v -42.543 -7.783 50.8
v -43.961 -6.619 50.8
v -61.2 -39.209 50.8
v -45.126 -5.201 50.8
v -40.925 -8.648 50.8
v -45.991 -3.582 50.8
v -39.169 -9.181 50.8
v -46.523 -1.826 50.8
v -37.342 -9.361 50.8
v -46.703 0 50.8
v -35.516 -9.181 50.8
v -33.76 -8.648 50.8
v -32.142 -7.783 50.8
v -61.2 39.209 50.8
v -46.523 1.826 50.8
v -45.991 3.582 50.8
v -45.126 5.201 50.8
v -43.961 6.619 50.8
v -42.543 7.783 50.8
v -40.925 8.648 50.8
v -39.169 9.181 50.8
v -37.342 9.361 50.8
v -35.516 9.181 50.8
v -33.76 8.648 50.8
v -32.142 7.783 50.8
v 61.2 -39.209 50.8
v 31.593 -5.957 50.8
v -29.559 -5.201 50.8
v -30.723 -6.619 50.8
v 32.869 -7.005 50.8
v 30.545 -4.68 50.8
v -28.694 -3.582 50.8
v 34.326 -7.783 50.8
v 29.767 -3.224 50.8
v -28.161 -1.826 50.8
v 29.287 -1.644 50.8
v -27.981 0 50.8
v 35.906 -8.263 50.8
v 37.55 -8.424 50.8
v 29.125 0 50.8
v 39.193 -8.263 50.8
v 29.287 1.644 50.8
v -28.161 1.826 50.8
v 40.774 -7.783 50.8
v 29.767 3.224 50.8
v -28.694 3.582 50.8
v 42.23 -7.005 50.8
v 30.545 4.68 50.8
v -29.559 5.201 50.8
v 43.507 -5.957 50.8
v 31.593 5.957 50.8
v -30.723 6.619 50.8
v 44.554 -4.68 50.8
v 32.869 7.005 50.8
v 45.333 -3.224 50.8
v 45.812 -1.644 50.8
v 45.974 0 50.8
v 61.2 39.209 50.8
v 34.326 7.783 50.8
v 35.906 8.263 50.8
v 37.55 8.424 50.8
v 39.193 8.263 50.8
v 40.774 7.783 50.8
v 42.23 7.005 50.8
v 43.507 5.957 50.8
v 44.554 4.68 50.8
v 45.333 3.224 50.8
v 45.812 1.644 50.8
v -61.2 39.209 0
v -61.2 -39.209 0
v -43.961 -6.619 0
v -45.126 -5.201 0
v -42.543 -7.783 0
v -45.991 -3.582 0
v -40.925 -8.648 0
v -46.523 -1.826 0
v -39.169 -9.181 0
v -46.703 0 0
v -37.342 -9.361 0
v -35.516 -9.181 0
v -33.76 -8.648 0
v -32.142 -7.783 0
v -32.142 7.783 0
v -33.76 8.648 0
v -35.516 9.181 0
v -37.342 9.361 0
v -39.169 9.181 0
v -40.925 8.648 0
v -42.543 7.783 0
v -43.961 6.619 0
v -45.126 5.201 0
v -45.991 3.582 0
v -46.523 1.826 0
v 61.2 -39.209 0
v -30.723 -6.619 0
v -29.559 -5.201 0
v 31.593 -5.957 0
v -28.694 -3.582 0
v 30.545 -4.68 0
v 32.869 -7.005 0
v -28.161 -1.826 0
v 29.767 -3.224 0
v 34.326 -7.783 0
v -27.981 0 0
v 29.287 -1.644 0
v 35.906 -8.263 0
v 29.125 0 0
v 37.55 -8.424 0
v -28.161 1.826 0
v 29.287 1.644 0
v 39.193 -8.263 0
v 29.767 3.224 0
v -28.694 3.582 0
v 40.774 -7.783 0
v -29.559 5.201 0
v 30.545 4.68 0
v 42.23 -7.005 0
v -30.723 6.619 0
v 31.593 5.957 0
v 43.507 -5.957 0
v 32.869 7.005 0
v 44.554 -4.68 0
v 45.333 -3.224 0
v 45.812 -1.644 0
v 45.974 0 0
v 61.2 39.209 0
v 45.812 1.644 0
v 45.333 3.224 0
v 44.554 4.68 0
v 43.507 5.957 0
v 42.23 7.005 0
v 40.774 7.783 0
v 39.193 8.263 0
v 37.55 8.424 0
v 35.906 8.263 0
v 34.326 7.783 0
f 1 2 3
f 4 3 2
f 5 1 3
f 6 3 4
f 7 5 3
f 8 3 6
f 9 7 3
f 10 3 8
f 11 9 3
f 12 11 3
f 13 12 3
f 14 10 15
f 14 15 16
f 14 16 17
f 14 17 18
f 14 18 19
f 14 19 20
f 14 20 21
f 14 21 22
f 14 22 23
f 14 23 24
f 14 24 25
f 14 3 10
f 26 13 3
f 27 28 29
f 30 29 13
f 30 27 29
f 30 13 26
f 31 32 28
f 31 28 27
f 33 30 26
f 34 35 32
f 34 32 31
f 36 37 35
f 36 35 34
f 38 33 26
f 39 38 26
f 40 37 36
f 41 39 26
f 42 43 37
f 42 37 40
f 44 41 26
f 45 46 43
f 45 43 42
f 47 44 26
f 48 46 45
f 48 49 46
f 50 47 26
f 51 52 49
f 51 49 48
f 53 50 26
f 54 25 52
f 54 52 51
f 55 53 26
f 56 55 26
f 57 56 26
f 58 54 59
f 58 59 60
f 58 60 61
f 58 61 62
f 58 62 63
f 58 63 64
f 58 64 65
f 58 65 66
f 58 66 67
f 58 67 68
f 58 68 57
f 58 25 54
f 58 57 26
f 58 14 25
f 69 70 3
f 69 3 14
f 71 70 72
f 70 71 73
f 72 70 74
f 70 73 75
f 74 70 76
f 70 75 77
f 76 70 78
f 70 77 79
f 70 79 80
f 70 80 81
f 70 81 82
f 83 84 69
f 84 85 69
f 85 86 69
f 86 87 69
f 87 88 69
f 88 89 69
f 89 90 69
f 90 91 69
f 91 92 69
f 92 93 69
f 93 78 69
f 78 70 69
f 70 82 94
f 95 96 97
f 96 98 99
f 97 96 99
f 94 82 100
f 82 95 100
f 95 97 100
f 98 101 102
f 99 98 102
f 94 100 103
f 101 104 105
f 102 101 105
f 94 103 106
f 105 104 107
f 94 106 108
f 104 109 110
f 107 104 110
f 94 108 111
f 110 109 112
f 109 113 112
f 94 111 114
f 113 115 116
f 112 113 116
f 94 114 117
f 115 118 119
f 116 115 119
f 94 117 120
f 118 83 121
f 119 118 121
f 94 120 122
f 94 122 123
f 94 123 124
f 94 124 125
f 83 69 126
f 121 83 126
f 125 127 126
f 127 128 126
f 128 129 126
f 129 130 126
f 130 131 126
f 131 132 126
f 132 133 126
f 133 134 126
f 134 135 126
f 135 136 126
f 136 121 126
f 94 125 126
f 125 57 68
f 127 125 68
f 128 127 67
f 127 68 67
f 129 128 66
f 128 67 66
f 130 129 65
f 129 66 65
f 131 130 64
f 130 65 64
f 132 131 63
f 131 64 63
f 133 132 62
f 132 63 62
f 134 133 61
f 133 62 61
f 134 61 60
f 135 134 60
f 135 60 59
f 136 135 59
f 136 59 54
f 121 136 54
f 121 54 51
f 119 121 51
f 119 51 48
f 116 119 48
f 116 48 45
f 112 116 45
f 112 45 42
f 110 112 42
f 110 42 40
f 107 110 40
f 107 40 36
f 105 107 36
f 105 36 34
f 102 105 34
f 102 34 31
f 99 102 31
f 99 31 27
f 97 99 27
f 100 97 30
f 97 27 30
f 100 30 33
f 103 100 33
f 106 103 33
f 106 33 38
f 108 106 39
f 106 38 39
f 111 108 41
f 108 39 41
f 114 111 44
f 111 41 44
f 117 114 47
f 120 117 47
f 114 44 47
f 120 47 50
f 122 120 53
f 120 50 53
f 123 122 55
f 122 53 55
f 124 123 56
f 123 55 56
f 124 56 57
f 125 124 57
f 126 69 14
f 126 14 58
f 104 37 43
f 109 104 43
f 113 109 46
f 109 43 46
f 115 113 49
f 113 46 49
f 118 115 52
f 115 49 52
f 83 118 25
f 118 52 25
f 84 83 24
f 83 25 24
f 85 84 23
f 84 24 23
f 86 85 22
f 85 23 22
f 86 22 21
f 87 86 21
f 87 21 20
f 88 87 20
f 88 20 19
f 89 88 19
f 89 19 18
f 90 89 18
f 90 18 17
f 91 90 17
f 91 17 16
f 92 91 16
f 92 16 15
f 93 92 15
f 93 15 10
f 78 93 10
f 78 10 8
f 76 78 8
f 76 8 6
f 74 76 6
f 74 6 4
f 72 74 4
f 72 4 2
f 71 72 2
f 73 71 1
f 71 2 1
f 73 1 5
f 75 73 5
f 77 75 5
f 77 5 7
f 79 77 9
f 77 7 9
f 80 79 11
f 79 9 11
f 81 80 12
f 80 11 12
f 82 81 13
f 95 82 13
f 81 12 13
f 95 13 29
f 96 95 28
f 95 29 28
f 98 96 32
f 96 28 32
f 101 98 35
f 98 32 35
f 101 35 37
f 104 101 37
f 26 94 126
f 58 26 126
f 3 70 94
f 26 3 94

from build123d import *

# Parameters (mm, degrees)
F0_W        = 122.399628
F0_H        = 78.418762
F1_DEPTH    = 50.8
F2_R        = 9.36089
F2_R_2      = 8.424406
F3_DEPTH    = 101.6
F3_FACE_R   = 9.36089
F3_FACE_R_2 = 8.424406
F4_DEPTH    = 101.6


with BuildPart() as f1:
    # F0 (on Top) → F1 (new body)
    with BuildSketch(Plane.XY):
        Rectangle(F0_W, F0_H)
    extrude(amount=F1_DEPTH)

    # F2 (on Top) → F3 (join)
    with BuildSketch(Plane.XY):
        with Locations((-37.34231, 0)):
            Circle(F2_R)
        with Locations((37.549719, 0)):
            Circle(F2_R_2)
    extrude(amount=F3_DEPTH)

    # F3_face (on face) → F4 (cut)
    with BuildSketch(Plane(origin=(-37.34231, 0, 101.6), x_dir=(1, 0, 0), z_dir=(0, 0, 1))):
        Circle(F3_FACE_R)
        with Locations((74.892029, 0)):
            Circle(F3_FACE_R_2)
    extrude(amount=-F4_DEPTH, mode=Mode.SUBTRACT)


solid = f1.part
